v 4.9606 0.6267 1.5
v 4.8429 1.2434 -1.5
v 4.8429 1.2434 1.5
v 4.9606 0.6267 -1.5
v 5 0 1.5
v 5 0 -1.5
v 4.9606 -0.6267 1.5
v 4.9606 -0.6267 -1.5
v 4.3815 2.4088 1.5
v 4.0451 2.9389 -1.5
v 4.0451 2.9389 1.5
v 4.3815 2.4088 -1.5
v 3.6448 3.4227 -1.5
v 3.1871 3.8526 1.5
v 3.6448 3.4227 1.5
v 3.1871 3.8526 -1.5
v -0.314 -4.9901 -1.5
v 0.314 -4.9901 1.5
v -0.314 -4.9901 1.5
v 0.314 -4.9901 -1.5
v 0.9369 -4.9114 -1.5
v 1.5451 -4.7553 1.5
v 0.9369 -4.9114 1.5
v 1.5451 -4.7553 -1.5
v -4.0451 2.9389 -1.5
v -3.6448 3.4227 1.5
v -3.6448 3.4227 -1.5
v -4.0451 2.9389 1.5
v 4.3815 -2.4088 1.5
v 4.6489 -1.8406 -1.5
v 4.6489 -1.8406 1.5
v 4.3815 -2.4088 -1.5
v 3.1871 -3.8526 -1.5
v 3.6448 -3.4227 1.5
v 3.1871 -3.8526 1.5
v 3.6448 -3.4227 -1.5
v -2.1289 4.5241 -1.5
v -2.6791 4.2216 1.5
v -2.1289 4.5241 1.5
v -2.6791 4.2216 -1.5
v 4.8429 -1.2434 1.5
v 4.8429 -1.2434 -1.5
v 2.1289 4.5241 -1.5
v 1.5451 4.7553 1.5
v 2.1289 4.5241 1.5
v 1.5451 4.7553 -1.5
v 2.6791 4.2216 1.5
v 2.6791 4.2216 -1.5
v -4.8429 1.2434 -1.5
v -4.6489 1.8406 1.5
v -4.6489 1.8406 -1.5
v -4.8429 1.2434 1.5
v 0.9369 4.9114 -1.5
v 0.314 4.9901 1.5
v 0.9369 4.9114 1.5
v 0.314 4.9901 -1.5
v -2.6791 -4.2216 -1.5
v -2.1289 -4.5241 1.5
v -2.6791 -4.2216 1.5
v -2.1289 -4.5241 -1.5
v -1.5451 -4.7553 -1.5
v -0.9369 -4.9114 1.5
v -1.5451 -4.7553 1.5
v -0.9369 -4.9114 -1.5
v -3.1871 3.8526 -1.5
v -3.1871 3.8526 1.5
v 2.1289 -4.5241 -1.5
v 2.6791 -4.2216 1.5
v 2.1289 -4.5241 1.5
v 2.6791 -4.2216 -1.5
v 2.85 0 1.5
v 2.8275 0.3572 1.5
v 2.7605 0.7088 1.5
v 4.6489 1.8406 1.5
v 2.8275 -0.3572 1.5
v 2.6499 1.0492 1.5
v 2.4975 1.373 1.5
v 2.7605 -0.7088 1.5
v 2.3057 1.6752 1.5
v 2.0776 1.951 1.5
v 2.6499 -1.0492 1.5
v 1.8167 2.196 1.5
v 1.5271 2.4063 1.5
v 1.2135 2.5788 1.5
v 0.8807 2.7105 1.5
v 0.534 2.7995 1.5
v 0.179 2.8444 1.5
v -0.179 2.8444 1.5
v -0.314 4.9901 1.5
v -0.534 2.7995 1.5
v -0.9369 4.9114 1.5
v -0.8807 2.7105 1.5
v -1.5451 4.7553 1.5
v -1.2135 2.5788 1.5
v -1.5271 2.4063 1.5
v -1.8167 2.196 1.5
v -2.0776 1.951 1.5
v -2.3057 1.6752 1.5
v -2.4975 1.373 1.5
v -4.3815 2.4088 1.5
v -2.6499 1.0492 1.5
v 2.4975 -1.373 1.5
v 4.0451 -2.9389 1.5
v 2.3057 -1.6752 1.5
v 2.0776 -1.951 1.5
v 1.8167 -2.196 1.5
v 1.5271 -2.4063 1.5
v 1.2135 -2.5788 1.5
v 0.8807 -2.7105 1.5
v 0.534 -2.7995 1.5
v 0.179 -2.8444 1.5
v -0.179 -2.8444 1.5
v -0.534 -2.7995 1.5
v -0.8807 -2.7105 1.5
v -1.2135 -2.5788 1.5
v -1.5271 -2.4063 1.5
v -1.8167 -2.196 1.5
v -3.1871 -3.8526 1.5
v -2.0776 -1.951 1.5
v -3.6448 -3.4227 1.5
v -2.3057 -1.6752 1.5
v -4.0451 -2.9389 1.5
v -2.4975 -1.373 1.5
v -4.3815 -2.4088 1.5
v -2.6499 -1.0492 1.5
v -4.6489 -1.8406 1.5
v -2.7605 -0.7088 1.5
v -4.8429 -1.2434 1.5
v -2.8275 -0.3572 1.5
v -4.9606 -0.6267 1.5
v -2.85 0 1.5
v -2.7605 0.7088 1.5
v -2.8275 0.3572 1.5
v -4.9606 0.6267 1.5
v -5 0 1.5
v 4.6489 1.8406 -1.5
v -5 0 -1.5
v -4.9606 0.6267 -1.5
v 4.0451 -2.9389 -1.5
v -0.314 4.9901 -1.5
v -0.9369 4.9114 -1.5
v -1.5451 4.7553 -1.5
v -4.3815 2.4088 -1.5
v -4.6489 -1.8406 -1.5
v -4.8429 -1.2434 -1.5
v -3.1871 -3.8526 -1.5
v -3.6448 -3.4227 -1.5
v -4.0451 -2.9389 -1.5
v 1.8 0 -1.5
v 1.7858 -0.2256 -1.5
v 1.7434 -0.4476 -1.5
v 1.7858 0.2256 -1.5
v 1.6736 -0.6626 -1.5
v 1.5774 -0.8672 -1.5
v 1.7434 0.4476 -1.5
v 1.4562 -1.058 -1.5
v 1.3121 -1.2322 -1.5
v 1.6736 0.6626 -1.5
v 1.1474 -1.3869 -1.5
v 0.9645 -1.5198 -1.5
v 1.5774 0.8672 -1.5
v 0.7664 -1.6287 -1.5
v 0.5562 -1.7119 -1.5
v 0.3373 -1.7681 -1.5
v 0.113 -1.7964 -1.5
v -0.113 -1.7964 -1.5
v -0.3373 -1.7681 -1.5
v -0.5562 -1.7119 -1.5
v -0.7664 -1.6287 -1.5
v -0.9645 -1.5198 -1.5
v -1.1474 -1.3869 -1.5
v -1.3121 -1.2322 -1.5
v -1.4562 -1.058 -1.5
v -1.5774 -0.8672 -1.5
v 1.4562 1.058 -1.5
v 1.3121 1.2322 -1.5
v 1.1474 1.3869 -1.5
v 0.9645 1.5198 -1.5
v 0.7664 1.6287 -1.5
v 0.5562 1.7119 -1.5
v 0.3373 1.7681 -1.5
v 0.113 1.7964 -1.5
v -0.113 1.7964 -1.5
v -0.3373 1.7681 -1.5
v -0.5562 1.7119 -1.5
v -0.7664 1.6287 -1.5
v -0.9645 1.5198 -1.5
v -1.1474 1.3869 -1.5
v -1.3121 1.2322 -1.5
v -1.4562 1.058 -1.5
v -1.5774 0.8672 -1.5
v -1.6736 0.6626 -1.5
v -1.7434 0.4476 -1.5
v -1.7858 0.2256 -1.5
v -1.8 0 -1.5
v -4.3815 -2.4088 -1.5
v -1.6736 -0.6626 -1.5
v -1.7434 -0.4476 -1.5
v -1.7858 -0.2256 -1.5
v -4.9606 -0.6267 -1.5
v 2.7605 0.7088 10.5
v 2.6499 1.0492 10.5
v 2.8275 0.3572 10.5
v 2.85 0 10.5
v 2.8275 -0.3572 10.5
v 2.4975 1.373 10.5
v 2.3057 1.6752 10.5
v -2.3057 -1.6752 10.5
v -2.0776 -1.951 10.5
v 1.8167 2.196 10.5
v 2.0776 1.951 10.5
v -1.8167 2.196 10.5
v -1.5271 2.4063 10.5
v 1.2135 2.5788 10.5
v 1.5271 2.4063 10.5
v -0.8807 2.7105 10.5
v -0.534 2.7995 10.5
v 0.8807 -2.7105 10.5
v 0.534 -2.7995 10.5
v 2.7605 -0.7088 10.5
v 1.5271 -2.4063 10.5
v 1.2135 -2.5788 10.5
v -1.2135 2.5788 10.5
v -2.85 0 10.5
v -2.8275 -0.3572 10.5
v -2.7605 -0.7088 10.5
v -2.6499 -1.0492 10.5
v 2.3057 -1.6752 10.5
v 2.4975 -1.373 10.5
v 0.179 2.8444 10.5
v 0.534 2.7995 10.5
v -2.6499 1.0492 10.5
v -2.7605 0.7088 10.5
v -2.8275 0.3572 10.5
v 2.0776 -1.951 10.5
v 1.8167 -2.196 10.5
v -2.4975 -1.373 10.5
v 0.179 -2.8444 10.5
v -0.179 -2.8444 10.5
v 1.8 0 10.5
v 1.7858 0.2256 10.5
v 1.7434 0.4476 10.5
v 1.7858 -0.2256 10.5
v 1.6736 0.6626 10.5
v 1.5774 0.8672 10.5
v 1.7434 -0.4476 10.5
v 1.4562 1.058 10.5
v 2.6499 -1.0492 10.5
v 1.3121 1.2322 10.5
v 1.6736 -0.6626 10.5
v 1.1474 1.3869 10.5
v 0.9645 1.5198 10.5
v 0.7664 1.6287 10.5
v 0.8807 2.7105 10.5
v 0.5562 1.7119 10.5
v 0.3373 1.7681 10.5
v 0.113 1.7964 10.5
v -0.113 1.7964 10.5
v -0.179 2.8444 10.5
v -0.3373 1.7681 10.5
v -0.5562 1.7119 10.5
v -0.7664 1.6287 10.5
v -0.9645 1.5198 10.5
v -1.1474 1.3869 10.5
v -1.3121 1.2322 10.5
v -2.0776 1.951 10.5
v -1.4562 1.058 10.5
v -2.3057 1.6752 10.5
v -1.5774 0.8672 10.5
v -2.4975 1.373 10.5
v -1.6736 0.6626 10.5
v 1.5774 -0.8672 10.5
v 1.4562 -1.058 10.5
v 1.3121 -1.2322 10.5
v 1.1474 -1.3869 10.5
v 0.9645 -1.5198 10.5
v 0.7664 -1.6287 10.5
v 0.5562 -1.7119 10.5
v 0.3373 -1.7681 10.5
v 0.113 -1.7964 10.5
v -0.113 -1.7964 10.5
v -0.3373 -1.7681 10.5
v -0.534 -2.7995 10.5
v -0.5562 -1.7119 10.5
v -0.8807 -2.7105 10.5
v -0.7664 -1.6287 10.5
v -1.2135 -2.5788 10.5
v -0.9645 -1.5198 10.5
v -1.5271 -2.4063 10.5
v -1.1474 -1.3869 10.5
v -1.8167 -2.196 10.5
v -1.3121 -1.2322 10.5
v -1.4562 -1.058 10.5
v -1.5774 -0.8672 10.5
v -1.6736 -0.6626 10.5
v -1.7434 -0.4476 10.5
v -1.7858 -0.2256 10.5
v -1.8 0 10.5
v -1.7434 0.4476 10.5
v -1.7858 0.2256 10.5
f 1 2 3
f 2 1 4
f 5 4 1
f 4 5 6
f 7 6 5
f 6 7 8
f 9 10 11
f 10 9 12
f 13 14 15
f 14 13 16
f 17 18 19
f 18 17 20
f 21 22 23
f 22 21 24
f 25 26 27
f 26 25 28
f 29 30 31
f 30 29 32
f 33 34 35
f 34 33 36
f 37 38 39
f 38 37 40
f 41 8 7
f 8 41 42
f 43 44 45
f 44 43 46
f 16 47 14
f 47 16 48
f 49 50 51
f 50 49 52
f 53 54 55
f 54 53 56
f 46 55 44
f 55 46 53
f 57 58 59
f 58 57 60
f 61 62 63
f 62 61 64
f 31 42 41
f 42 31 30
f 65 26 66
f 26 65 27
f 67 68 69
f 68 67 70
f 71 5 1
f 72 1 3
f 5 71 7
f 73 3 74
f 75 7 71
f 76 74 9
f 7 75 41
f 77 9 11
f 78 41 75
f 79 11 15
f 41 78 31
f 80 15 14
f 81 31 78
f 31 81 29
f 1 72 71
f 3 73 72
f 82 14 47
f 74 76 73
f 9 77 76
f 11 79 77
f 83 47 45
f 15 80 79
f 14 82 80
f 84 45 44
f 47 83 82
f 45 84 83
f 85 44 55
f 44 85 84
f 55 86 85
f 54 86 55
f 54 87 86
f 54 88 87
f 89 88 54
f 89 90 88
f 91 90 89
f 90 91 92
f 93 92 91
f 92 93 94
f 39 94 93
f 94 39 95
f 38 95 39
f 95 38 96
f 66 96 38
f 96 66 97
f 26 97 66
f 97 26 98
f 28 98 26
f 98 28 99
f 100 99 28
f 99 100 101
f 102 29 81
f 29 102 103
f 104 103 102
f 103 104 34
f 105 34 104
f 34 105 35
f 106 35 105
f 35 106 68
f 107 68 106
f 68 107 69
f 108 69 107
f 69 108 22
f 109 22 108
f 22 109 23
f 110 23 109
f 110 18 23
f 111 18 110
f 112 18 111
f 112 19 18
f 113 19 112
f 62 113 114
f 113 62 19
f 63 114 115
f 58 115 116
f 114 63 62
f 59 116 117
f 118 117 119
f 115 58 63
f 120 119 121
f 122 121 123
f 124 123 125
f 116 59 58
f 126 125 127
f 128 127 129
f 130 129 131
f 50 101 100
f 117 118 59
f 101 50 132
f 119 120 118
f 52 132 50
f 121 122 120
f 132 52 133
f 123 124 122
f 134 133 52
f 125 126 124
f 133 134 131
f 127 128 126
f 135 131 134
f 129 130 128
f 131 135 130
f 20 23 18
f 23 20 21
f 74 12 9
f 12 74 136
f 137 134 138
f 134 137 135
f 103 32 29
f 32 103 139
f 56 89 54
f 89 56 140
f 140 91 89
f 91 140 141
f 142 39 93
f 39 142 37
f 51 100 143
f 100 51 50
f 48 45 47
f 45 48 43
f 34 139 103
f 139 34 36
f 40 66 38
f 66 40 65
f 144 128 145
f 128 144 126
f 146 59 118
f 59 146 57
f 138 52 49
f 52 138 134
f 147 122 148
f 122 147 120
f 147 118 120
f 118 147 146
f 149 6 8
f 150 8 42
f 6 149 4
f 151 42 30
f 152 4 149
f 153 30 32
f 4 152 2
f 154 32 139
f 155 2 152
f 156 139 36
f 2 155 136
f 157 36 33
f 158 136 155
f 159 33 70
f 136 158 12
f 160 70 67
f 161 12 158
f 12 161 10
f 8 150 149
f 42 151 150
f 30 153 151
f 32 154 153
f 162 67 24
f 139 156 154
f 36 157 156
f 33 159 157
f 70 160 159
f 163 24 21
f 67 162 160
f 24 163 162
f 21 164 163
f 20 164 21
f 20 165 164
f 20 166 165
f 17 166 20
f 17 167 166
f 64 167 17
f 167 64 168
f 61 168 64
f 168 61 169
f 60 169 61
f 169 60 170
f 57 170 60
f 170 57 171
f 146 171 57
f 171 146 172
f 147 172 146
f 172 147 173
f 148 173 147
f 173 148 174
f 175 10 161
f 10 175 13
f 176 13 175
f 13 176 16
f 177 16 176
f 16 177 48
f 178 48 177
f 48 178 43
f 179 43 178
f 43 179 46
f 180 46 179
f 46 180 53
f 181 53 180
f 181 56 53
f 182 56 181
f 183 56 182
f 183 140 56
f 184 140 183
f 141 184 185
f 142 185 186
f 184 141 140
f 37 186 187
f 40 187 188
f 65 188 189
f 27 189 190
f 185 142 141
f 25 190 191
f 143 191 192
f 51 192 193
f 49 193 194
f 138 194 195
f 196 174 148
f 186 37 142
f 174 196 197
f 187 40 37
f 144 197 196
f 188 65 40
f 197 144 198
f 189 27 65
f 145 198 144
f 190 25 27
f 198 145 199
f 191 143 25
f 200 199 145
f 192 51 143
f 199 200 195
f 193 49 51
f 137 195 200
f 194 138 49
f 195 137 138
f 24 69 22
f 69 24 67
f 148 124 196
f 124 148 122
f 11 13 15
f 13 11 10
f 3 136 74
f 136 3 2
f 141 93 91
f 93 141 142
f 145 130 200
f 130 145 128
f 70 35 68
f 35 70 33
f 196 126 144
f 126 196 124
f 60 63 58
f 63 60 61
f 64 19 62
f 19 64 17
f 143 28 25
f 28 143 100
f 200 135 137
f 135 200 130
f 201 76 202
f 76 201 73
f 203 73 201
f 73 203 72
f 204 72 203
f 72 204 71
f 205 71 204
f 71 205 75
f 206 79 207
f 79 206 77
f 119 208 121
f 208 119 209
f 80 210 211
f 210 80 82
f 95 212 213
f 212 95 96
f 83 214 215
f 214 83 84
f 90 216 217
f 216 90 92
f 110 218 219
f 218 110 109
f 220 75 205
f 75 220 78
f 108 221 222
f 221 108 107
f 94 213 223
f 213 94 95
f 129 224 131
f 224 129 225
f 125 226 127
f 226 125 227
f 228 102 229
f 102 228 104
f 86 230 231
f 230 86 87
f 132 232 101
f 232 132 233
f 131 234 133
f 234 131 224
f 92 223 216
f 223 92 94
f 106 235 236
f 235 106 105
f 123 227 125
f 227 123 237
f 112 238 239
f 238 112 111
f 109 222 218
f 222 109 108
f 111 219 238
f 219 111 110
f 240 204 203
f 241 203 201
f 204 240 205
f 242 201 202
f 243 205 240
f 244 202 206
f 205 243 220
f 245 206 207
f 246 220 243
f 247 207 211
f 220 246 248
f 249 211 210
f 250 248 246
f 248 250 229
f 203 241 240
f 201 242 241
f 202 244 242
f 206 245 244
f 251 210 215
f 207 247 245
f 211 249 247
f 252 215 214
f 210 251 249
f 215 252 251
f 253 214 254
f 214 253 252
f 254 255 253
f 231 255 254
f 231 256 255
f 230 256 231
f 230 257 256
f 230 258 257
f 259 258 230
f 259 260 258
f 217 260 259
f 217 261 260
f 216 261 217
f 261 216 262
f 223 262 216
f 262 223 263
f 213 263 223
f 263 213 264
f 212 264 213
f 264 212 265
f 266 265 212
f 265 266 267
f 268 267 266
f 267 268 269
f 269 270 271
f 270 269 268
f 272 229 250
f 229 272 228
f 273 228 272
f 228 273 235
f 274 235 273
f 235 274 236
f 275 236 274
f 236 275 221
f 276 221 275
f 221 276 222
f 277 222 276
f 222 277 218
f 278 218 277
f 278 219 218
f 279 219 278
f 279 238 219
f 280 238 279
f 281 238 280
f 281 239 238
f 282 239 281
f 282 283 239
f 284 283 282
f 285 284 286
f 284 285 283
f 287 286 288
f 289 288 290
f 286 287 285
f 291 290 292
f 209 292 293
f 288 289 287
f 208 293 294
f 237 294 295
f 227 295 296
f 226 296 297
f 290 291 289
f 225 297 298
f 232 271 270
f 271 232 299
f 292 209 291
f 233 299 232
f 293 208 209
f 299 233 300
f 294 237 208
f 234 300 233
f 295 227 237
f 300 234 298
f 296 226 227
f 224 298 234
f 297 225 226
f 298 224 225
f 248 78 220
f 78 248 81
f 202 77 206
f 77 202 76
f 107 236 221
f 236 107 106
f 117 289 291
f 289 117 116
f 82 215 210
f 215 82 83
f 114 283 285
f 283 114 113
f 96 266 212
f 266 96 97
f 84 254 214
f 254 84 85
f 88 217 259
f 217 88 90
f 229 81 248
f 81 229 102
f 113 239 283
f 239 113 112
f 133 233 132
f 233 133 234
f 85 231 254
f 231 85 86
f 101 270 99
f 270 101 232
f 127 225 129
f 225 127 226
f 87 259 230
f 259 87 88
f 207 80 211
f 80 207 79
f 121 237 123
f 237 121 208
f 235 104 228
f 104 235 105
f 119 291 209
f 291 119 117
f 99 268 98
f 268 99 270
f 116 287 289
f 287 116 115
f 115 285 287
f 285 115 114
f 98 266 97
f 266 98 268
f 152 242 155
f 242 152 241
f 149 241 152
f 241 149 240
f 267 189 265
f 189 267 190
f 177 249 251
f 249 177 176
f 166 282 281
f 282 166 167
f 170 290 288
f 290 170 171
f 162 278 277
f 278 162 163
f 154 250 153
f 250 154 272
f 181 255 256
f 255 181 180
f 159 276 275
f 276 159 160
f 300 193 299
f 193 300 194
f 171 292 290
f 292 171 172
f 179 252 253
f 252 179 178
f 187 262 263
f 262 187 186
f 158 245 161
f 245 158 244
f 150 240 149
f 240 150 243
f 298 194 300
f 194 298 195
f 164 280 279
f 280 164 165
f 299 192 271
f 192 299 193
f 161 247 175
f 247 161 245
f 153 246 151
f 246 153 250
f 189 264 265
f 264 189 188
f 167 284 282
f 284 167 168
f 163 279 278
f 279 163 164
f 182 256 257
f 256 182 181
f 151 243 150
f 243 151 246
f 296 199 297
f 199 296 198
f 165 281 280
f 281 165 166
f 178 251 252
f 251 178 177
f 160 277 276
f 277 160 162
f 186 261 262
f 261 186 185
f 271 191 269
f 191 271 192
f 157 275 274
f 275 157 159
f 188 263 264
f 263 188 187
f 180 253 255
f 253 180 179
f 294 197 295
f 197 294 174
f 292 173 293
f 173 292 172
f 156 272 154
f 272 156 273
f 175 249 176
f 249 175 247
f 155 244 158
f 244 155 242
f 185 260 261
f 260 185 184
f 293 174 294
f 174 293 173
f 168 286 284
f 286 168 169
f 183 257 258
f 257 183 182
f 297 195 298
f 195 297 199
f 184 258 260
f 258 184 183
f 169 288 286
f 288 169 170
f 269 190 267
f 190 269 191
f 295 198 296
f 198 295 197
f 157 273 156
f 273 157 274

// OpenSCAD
$fn = 50;


difference() {
	union() {
		translate(v = [0, 0, -1.5000000000]) {
			cylinder(h = 3, r = 5.0000000000);
		}
		translate(v = [0, 0, -1.5000000000]) {
			cylinder(h = 12, r = 2.8500000000);
		}
	}
	union() {
		translate(v = [0, 0, -50.0000000000]) {
			cylinder(h = 100, r = 1.8000000000);
		}
	}
}
